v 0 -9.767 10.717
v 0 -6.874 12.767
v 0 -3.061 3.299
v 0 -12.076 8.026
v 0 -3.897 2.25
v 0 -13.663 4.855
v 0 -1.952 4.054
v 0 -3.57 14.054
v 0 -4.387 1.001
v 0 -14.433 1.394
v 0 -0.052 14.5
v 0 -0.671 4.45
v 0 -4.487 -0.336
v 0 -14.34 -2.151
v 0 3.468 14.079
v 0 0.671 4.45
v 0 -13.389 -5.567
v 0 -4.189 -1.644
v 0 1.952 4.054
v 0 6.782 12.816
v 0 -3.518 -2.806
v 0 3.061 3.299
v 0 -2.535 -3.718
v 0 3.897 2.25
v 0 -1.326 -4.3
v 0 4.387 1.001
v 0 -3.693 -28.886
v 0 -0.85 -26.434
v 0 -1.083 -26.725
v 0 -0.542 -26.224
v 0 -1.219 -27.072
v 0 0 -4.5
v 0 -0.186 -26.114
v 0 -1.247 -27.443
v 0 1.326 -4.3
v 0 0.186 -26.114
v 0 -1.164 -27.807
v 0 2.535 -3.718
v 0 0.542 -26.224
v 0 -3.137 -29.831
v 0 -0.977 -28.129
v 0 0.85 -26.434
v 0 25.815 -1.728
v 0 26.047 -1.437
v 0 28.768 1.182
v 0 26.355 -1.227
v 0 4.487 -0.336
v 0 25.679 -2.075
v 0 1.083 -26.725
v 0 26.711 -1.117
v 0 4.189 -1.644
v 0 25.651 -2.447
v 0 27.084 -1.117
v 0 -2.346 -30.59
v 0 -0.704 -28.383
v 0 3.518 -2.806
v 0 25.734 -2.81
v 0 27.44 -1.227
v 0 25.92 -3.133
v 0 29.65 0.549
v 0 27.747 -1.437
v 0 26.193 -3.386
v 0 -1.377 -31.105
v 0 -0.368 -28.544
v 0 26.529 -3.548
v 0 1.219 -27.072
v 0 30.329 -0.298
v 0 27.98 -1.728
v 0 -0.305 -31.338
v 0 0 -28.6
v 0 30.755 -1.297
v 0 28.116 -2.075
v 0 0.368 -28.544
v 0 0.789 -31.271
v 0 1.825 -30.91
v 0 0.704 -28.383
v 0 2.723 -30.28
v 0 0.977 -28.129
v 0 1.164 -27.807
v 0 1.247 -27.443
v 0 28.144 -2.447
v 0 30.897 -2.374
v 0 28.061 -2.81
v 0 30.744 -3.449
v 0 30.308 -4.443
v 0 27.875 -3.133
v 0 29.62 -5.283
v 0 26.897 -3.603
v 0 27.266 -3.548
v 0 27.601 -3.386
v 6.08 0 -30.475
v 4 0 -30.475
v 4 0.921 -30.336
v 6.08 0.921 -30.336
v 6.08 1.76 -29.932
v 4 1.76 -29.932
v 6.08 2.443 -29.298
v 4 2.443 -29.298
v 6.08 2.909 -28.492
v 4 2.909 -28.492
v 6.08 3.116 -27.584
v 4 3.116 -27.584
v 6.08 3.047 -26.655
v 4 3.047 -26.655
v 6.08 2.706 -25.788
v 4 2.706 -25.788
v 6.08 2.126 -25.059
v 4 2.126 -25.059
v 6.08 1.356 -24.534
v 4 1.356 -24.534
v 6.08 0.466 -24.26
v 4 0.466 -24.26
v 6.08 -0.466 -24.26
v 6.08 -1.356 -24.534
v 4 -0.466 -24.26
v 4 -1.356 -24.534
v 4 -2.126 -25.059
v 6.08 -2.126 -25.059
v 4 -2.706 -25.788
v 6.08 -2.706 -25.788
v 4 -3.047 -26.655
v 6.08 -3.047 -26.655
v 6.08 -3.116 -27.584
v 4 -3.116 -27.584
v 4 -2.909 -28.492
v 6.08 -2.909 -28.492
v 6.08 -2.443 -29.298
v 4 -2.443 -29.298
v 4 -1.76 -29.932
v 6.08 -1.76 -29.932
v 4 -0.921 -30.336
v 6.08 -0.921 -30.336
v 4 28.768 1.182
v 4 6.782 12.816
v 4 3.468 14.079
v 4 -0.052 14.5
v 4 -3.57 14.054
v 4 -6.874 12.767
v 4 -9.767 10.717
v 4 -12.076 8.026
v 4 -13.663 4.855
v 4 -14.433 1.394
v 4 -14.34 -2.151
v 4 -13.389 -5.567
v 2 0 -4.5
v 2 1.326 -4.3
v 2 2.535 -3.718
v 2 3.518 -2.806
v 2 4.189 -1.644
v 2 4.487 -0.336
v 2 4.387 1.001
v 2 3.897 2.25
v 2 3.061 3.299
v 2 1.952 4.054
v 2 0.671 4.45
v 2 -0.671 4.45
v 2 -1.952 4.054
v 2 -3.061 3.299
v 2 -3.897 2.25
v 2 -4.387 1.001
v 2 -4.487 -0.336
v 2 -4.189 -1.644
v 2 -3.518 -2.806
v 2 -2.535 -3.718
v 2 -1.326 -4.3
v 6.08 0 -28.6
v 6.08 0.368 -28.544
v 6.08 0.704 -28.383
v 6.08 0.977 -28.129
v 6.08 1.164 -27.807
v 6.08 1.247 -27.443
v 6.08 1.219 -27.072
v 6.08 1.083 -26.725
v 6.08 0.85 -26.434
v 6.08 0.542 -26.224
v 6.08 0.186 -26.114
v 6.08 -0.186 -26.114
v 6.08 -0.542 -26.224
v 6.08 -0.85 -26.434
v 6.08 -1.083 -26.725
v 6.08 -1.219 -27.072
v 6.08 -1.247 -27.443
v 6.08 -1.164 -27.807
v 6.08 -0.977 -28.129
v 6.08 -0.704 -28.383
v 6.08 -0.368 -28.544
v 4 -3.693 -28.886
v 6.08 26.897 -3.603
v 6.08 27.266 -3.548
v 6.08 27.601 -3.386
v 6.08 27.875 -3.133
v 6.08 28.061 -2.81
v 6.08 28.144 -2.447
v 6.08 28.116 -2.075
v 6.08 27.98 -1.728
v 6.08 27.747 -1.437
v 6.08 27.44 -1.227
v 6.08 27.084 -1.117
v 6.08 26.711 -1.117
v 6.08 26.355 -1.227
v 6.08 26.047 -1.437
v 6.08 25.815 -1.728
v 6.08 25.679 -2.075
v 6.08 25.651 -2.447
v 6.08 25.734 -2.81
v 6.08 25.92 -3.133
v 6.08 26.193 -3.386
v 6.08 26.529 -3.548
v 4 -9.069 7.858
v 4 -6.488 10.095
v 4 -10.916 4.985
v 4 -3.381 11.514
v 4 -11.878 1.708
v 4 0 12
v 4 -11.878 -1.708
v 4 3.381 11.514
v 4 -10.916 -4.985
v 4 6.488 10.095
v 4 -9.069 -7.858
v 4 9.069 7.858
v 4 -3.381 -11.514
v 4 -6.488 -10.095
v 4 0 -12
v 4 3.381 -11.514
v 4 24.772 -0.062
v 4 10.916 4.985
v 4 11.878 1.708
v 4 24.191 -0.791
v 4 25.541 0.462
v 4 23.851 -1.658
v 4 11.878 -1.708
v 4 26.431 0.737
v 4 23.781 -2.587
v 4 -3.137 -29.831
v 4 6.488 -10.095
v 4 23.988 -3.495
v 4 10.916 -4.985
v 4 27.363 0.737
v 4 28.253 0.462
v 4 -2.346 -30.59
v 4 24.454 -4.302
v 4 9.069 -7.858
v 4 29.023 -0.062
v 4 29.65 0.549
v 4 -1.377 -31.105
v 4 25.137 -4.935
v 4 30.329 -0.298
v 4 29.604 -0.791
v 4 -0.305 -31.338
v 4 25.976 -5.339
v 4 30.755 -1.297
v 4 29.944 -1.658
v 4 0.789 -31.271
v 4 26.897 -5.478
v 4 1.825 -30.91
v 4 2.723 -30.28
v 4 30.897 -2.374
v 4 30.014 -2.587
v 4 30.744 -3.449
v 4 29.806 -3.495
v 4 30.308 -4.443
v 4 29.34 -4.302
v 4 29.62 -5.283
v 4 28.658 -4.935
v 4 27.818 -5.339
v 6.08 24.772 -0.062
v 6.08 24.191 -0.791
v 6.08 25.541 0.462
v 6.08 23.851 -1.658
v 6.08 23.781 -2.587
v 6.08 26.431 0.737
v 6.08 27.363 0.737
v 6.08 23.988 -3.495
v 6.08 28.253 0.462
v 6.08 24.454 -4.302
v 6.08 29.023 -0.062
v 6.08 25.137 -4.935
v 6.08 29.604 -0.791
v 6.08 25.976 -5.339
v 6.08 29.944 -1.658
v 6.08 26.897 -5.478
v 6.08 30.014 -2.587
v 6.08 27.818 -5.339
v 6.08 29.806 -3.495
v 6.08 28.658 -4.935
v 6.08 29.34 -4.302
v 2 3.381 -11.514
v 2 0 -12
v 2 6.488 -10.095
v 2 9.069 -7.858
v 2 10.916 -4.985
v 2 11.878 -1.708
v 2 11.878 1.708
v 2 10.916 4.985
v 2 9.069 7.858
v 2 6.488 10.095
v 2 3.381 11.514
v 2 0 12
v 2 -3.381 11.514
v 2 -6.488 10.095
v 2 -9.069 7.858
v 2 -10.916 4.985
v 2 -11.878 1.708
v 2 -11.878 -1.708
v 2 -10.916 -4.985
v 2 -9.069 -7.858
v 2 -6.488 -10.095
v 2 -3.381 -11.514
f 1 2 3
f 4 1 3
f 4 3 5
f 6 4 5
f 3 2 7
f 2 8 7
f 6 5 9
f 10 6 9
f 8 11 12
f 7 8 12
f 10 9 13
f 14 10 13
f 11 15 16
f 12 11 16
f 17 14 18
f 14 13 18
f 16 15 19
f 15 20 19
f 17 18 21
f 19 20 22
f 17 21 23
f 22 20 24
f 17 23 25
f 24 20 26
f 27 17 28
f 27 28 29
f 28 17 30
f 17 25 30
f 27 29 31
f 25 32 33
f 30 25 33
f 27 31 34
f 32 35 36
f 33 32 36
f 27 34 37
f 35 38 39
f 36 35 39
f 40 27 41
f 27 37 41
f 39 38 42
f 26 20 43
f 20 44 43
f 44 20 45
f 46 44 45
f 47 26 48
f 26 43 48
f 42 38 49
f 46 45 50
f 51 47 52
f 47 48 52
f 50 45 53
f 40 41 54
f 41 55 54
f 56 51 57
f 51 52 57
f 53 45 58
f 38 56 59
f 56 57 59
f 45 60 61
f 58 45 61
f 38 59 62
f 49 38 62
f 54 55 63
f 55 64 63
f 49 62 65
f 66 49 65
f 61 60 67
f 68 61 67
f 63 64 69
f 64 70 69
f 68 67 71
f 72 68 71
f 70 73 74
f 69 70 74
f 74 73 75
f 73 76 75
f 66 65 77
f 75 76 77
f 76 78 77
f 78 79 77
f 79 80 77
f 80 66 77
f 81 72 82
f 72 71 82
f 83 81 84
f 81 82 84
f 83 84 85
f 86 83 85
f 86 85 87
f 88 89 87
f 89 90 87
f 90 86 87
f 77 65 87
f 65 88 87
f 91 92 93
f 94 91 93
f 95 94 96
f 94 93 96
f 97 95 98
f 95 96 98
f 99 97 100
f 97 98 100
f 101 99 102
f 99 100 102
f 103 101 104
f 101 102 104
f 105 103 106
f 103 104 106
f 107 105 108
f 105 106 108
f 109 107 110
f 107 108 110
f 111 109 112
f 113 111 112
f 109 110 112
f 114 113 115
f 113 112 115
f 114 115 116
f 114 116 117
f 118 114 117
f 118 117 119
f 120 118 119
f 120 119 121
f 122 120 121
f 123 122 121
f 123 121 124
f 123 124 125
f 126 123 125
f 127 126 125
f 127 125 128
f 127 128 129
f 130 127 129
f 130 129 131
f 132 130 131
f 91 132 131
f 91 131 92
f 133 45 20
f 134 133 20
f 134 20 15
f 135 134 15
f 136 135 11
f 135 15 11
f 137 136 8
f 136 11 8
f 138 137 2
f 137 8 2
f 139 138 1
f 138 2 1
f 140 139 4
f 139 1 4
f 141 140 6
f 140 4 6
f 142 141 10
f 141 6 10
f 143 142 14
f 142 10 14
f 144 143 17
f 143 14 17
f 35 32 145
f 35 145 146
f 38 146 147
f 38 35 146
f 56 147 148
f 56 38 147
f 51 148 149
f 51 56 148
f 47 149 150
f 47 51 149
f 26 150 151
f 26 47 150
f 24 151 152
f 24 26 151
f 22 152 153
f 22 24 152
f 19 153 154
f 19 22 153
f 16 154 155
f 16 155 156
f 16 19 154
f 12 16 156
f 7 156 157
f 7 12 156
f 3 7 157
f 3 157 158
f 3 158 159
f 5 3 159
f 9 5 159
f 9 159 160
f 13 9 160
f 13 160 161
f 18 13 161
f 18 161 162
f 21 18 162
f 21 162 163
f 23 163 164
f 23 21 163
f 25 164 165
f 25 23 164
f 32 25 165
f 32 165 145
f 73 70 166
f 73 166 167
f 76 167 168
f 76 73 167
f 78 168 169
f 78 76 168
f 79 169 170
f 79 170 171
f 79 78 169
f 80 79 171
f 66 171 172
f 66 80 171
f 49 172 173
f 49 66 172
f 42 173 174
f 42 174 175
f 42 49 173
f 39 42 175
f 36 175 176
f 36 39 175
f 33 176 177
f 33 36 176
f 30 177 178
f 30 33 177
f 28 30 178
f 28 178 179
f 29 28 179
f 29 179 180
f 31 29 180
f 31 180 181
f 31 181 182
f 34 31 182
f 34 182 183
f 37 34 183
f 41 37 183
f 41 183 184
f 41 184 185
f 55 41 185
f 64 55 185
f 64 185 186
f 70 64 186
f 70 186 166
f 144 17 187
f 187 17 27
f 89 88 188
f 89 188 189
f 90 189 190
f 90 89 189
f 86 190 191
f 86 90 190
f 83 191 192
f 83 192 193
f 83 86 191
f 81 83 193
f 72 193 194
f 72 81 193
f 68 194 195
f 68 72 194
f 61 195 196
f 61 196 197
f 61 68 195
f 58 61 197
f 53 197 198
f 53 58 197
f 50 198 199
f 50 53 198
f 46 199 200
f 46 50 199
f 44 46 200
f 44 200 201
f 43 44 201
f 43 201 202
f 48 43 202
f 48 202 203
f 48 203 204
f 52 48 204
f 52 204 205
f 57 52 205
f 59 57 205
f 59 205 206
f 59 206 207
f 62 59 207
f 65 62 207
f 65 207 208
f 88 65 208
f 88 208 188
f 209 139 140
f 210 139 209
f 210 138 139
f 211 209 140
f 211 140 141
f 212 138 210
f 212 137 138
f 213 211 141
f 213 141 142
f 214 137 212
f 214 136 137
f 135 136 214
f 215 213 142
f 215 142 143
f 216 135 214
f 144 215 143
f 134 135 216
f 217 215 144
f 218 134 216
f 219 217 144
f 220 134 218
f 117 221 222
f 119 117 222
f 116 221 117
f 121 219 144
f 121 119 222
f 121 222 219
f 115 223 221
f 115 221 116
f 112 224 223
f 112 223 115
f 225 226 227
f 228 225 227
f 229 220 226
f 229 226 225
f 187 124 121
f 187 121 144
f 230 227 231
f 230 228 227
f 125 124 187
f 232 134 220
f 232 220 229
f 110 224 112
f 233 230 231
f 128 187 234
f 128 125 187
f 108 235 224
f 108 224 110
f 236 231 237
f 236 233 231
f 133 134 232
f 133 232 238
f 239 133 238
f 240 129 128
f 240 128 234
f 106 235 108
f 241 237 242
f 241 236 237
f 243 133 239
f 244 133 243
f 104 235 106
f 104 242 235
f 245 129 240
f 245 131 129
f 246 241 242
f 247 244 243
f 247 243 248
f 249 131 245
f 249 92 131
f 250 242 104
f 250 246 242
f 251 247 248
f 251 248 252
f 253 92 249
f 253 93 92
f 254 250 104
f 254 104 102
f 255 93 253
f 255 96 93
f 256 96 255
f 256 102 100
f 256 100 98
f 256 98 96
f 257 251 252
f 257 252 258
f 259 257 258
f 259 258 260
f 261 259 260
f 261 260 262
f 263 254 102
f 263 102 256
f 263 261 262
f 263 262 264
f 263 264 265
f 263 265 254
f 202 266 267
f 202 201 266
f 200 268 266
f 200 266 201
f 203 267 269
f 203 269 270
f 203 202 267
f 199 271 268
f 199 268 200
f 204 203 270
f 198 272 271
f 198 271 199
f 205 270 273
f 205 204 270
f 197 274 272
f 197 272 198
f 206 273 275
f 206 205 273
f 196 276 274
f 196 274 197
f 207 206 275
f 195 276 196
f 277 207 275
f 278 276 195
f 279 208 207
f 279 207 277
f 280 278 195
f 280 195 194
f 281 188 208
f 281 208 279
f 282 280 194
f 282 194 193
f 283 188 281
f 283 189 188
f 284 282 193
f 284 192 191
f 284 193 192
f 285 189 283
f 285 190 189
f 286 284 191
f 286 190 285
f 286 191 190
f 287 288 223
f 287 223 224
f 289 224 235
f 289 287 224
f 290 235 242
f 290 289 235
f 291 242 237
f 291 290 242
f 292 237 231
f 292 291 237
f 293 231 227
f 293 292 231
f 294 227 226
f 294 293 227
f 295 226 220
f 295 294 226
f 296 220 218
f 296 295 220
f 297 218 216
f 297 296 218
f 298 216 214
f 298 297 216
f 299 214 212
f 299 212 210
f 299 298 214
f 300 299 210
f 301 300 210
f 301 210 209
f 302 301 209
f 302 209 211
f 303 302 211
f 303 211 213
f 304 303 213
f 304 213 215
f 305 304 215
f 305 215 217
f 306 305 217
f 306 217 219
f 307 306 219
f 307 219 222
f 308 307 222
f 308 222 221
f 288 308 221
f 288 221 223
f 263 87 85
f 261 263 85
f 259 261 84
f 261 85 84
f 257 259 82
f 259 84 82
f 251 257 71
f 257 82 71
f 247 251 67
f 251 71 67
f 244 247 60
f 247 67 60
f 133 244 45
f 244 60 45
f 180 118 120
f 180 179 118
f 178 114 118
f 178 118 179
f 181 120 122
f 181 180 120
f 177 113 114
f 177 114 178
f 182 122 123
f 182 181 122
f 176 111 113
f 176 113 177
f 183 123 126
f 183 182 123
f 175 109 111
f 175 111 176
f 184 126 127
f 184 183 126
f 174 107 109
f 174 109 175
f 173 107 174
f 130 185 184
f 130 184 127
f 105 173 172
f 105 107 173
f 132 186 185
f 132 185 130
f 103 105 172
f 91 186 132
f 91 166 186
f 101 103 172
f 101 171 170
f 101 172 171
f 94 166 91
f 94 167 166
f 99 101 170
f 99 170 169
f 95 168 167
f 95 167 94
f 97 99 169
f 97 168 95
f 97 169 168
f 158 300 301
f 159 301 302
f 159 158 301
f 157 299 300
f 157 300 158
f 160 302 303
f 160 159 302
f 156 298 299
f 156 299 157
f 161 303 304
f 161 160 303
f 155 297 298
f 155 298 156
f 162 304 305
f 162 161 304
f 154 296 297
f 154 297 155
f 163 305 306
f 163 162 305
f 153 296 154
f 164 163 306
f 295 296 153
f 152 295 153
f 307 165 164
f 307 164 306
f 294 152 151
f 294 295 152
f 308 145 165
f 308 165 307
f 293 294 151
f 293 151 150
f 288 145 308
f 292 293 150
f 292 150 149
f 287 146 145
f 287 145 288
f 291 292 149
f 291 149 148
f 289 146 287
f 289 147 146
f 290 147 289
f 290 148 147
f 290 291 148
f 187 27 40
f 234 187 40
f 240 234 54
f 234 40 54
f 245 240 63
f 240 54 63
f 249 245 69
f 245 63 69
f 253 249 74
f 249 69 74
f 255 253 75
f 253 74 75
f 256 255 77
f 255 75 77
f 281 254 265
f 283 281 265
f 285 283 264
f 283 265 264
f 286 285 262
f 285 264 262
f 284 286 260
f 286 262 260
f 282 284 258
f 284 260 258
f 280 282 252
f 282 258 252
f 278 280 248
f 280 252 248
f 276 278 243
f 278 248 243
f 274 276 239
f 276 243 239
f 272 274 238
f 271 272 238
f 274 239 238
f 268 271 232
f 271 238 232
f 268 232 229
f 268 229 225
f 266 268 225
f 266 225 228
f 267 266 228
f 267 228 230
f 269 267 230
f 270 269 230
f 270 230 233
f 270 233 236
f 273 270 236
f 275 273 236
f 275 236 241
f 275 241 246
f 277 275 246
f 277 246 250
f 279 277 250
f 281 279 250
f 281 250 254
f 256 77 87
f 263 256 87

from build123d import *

# Parameters (mm, degrees)
SKETCH1_R           = 12
SKETCH1_R_2         = 1.25
BOSS_EXTRUDE1_DEPTH = 4
SKETCH1_3_R         = 3.125
SKETCH1_3_R_2       = 1.25
BOSS_EXTRUDE2_DEPTH = 6.08
SKETCH1_4_R         = 12
SKETCH1_4_R_2       = 4.5
BOSS_EXTRUDE3_DEPTH = 2


with BuildPart() as part:
    # Sketch1 → Boss-Extrude1 (new body)
    with BuildSketch(Plane(origin=(0, 0, 0), x_dir=(0, 0, -1), z_dir=(1, 0, 0))):
        with BuildLine():
            Line((30.280045487, 2.723019178), (5.283250541, 29.620276026))
            ThreePointArc((5.283250541, 29.620276026), (1.830502506, 30.862957549), (-1.182334937, 28.768074042))
            Line((-1.182334937, 28.768074042), (-12.816332467, 6.781712327))
            ThreePointArc((-12.816332467, 6.781712327), (-10.716910889, -9.767180811), (5.566727605, -13.388858942))
            Line((5.566727605, -13.388858942), (28.885648995, -3.693478329))
            ThreePointArc((28.885648995, -3.693478329), (31.258767947, -0.849431066), (30.280045487, 2.723019178))
        make_face()
        Circle(SKETCH1_R, mode=Mode.SUBTRACT)
        with Locations((2.353205054, 26.897256848)):
            Circle(SKETCH1_R_2, mode=Mode.SUBTRACT)
        with Locations((27.35, 0)):
            Circle(SKETCH1_R_2, mode=Mode.SUBTRACT)
    extrude(amount=BOSS_EXTRUDE1_DEPTH)

    # Sketch1<3> → Boss-Extrude2 (add)
    # profile 1 of 2: a face of its own
    with BuildSketch(Plane(origin=(0, 0, 0), x_dir=(0, 0, -1), z_dir=(1, 0, 0))):
        with Locations((2.353205054, 26.897256848)):
            Circle(SKETCH1_3_R)
        with Locations((2.353205054, 26.897256848)):
            Circle(SKETCH1_3_R_2, mode=Mode.SUBTRACT)
    # profile 2 of 2: a face of its own
    with BuildSketch(Plane(origin=(0, 0, 0), x_dir=(0, 0, -1), z_dir=(1, 0, 0))):
        with Locations((27.35, 0)):
            Circle(SKETCH1_3_R)
        with Locations((27.35, 0)):
            Circle(SKETCH1_3_R_2, mode=Mode.SUBTRACT)
    extrude(amount=BOSS_EXTRUDE2_DEPTH)

    # Sketch1<4> → Boss-Extrude3 (add)
    with BuildSketch(Plane(origin=(0, 0, 0), x_dir=(0, 0, -1), z_dir=(1, 0, 0))):
        Circle(SKETCH1_4_R)
        Circle(SKETCH1_4_R_2, mode=Mode.SUBTRACT)
    extrude(amount=BOSS_EXTRUDE3_DEPTH)


solid = part.part
